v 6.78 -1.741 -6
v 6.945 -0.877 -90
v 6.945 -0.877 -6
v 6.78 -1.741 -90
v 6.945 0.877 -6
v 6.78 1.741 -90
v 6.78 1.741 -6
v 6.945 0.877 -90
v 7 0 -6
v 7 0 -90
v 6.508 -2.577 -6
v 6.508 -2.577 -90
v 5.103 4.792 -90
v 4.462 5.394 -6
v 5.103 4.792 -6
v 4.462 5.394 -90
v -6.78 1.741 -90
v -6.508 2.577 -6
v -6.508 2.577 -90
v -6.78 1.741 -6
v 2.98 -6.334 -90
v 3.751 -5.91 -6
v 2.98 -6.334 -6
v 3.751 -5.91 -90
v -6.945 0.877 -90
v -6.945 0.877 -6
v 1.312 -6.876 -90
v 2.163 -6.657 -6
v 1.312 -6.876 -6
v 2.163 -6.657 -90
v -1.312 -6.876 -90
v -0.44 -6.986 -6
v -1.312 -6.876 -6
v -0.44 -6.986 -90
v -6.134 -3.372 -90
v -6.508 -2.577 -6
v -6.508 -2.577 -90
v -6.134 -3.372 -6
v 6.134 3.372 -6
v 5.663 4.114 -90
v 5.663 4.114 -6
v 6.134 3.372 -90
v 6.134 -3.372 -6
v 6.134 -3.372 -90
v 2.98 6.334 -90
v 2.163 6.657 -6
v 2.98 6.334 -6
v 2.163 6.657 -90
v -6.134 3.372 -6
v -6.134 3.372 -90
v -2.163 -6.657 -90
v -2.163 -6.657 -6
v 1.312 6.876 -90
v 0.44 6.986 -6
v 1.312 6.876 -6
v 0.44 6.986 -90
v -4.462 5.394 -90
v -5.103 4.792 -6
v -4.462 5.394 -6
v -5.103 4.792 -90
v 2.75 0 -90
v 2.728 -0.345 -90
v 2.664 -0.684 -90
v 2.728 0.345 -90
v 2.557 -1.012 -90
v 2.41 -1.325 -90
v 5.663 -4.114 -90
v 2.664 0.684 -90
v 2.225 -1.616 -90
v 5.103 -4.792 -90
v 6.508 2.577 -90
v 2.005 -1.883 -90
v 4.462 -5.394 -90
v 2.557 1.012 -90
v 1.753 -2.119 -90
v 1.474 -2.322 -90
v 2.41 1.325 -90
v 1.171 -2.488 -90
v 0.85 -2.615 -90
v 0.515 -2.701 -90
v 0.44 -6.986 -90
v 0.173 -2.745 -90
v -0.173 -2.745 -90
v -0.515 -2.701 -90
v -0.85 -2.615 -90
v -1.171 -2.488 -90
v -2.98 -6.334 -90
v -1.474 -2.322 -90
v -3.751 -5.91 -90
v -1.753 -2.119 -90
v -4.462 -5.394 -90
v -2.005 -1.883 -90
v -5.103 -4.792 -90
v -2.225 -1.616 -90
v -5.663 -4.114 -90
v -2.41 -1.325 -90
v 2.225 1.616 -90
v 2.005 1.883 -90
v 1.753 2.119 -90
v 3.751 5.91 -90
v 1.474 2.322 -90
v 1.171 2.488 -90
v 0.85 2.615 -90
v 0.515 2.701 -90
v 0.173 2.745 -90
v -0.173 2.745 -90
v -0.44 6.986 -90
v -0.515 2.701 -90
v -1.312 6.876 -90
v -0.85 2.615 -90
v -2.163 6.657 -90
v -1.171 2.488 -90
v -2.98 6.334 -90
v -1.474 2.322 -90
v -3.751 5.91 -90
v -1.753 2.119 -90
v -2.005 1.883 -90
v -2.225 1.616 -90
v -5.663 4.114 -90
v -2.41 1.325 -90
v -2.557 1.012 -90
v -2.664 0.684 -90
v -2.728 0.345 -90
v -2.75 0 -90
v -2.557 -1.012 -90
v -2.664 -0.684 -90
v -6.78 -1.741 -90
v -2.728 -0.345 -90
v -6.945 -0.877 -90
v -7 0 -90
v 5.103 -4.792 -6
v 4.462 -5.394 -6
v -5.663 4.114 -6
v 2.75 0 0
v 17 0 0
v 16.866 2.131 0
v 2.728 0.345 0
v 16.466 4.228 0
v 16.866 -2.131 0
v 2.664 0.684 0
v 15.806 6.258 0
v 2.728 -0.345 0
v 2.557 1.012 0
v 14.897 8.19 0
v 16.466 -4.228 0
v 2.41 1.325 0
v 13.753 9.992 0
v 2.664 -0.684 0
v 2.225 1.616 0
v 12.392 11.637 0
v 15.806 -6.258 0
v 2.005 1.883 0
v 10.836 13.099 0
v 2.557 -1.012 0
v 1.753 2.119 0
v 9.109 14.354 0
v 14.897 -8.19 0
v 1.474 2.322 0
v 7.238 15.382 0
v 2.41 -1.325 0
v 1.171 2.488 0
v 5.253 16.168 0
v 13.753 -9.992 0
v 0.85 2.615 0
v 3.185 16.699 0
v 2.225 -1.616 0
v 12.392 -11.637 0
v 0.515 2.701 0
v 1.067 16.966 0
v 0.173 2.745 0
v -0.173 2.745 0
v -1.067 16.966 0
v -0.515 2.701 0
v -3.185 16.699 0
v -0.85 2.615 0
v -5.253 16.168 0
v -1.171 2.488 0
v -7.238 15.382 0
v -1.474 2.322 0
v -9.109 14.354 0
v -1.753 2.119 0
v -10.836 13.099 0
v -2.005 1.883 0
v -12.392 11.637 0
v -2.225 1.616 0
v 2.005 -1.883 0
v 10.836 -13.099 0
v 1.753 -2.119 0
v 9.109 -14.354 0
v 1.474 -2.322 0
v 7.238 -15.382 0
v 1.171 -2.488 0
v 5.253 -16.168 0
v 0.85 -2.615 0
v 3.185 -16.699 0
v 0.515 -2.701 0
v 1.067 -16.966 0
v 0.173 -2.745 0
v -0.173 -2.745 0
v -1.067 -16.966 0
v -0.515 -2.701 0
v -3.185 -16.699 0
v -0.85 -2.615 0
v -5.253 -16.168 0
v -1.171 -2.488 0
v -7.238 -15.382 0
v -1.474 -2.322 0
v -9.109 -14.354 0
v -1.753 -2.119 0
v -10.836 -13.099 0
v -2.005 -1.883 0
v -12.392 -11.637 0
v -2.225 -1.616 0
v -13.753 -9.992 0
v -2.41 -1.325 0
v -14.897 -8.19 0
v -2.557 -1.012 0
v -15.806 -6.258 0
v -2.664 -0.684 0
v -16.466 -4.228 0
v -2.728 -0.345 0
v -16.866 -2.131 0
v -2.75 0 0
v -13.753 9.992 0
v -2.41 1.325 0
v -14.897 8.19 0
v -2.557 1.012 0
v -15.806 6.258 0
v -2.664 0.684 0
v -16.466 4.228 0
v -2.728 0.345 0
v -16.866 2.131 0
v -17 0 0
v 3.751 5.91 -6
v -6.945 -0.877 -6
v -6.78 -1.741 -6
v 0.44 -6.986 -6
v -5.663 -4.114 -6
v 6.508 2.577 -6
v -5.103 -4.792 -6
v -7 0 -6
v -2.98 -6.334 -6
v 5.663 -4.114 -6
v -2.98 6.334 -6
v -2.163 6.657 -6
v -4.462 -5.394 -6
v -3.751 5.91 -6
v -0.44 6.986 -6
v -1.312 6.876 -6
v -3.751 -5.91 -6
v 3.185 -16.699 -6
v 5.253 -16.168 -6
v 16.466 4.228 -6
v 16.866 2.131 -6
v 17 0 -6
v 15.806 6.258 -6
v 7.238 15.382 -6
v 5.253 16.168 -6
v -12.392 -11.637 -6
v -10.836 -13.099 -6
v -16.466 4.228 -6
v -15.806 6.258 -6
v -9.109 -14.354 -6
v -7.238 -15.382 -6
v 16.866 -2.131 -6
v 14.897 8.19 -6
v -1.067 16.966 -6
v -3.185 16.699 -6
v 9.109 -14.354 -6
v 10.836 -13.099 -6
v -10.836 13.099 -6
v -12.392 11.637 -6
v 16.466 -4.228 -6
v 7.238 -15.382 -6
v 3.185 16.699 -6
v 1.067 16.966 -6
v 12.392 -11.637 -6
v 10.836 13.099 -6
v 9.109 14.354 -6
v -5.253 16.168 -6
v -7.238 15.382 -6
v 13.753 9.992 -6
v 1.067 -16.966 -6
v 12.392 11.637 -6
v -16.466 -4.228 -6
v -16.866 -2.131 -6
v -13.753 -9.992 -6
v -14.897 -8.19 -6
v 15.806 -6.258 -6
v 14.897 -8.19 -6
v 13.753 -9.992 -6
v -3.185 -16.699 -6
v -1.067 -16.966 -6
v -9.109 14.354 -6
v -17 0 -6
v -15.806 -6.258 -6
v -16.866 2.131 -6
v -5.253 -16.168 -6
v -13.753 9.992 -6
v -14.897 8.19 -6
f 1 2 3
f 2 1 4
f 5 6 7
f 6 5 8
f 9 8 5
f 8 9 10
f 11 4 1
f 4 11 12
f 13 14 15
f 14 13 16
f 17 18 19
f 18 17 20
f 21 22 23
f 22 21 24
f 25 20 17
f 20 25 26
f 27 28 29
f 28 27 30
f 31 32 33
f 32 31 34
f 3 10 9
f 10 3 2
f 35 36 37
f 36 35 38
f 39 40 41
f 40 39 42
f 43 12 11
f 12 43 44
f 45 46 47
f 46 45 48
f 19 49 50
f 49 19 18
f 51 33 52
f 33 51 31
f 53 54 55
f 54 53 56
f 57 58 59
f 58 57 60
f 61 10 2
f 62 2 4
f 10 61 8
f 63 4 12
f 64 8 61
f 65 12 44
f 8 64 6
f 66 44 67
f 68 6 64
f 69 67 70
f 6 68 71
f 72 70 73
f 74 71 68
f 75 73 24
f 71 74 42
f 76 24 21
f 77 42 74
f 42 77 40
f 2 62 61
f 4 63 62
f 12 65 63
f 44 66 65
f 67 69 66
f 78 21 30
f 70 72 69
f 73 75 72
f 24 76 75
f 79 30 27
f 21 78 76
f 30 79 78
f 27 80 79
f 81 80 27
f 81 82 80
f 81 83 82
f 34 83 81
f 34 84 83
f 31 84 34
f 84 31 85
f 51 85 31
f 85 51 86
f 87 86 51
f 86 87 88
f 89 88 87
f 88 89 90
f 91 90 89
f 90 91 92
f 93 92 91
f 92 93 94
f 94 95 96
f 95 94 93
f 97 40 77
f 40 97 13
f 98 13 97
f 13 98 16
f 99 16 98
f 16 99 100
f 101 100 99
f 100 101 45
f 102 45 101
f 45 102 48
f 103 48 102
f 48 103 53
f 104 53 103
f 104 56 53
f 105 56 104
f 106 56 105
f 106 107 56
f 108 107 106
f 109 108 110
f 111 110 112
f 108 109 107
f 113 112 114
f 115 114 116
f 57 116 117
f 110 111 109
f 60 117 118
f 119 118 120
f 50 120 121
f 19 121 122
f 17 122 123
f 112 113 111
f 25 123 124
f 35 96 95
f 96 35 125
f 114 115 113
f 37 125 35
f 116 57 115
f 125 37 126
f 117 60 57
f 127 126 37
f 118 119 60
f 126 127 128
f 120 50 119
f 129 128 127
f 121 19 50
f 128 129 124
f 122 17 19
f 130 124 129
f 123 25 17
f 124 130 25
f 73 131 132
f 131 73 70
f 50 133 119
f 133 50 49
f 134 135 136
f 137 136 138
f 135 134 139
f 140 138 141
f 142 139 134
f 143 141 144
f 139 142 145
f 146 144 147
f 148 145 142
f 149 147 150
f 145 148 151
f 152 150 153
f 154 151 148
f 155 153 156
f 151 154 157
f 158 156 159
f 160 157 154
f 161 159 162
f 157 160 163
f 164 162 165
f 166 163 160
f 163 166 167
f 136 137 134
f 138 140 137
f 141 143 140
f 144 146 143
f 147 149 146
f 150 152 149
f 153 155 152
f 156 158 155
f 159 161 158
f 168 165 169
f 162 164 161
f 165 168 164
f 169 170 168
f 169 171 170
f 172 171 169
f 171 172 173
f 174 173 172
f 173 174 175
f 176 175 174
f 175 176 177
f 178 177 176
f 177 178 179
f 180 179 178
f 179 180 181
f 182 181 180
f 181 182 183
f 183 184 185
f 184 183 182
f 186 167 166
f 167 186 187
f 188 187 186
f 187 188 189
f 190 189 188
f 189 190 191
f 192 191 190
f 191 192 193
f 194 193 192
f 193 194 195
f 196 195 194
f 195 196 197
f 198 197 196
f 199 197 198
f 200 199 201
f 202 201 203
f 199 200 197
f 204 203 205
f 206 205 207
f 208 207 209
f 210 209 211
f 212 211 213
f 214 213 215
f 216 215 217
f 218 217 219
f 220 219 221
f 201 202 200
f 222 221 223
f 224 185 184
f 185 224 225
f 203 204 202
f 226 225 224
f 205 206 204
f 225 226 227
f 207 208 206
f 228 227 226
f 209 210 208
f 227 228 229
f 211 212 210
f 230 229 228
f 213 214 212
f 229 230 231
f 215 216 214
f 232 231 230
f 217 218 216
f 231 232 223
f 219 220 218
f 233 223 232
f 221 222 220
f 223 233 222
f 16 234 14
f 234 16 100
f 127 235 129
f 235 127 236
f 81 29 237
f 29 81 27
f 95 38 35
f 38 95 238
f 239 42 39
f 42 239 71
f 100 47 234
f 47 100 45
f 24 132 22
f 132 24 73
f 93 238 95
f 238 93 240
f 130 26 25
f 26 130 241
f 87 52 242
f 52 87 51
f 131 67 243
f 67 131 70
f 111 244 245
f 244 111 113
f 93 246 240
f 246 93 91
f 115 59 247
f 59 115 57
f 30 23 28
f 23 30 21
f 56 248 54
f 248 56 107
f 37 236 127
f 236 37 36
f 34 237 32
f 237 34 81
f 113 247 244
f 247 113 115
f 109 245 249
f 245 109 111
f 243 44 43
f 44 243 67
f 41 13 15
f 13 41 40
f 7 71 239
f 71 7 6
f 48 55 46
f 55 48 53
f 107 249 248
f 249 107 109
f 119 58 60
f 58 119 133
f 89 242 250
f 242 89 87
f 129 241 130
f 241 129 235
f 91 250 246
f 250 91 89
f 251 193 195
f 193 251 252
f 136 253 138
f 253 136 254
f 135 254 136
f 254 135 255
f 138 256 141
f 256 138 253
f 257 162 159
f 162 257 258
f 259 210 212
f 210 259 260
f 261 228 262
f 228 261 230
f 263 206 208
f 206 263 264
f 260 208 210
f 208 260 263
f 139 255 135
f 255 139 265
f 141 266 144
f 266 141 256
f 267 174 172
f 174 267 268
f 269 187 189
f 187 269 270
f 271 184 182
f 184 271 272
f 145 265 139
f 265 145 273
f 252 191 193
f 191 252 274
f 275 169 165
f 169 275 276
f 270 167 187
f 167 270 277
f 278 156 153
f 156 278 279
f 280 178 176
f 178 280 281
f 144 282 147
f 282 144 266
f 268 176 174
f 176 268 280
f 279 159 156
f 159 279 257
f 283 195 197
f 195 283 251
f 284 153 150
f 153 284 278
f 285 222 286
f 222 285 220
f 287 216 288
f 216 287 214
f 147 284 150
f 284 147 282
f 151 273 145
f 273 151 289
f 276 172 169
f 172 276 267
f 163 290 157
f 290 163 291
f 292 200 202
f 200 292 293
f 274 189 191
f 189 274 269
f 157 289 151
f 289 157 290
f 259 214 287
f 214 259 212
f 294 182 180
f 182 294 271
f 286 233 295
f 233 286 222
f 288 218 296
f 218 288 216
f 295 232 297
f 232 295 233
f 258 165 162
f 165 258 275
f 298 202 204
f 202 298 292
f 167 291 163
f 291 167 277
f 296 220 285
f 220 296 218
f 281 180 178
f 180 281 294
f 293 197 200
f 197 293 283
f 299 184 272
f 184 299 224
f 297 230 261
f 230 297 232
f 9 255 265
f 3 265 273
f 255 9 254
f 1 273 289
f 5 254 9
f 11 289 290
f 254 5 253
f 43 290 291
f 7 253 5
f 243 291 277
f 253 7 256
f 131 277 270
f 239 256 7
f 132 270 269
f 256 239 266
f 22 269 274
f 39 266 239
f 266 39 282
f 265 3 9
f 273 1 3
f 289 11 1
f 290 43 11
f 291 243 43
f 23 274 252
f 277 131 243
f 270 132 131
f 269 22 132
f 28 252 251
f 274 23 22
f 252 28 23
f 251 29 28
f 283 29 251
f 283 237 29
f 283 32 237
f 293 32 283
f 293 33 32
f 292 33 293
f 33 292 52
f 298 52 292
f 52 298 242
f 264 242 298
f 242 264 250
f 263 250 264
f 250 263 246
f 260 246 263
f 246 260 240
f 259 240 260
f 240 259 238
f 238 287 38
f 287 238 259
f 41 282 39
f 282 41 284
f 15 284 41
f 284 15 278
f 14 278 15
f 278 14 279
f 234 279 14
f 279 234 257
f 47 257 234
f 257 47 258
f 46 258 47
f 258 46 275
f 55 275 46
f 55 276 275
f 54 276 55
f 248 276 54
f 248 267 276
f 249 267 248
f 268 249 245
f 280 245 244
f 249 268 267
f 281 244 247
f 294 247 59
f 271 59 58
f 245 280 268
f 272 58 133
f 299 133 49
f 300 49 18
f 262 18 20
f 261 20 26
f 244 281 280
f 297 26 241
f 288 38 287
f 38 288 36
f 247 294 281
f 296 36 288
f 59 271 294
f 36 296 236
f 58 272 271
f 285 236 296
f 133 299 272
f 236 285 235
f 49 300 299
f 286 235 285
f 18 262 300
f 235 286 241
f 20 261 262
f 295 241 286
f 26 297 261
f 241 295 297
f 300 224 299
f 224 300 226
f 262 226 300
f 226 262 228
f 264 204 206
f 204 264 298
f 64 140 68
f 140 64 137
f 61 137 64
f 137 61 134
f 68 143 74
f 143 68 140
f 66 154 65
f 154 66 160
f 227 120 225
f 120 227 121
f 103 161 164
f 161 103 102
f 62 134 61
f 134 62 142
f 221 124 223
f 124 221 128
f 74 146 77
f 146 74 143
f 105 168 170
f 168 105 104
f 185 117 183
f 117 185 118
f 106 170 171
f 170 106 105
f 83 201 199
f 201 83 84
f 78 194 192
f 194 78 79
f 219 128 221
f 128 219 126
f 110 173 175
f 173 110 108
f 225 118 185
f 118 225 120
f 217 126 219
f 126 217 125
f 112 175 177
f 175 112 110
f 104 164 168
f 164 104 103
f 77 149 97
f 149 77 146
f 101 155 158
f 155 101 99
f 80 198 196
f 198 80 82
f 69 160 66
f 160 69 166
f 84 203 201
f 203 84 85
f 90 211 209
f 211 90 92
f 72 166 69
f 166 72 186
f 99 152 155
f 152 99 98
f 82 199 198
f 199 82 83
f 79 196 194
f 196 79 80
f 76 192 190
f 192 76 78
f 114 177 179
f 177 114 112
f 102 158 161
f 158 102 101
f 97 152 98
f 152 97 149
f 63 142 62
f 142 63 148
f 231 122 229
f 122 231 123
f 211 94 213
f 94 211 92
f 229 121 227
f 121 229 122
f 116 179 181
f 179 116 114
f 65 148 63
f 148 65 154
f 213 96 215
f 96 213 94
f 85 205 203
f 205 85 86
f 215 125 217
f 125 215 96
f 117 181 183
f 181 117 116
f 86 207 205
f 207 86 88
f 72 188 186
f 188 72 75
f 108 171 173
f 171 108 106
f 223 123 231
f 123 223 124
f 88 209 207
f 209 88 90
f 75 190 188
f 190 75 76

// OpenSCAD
$fn = 50;


difference() {
	union() {
		translate(v = [0, 0, -90.0000000000]) {
			cylinder(h = 90, r = 7.0000000000);
		}
		translate(v = [0, 0, -6.0000000000]) {
			cylinder(h = 6, r = 17.0000000000);
		}
	}
	union() {
		#translate(v = [0, 0, -90]) {
			cylinder(h = 90, r = 2.7500000000);
		}
	}
}
